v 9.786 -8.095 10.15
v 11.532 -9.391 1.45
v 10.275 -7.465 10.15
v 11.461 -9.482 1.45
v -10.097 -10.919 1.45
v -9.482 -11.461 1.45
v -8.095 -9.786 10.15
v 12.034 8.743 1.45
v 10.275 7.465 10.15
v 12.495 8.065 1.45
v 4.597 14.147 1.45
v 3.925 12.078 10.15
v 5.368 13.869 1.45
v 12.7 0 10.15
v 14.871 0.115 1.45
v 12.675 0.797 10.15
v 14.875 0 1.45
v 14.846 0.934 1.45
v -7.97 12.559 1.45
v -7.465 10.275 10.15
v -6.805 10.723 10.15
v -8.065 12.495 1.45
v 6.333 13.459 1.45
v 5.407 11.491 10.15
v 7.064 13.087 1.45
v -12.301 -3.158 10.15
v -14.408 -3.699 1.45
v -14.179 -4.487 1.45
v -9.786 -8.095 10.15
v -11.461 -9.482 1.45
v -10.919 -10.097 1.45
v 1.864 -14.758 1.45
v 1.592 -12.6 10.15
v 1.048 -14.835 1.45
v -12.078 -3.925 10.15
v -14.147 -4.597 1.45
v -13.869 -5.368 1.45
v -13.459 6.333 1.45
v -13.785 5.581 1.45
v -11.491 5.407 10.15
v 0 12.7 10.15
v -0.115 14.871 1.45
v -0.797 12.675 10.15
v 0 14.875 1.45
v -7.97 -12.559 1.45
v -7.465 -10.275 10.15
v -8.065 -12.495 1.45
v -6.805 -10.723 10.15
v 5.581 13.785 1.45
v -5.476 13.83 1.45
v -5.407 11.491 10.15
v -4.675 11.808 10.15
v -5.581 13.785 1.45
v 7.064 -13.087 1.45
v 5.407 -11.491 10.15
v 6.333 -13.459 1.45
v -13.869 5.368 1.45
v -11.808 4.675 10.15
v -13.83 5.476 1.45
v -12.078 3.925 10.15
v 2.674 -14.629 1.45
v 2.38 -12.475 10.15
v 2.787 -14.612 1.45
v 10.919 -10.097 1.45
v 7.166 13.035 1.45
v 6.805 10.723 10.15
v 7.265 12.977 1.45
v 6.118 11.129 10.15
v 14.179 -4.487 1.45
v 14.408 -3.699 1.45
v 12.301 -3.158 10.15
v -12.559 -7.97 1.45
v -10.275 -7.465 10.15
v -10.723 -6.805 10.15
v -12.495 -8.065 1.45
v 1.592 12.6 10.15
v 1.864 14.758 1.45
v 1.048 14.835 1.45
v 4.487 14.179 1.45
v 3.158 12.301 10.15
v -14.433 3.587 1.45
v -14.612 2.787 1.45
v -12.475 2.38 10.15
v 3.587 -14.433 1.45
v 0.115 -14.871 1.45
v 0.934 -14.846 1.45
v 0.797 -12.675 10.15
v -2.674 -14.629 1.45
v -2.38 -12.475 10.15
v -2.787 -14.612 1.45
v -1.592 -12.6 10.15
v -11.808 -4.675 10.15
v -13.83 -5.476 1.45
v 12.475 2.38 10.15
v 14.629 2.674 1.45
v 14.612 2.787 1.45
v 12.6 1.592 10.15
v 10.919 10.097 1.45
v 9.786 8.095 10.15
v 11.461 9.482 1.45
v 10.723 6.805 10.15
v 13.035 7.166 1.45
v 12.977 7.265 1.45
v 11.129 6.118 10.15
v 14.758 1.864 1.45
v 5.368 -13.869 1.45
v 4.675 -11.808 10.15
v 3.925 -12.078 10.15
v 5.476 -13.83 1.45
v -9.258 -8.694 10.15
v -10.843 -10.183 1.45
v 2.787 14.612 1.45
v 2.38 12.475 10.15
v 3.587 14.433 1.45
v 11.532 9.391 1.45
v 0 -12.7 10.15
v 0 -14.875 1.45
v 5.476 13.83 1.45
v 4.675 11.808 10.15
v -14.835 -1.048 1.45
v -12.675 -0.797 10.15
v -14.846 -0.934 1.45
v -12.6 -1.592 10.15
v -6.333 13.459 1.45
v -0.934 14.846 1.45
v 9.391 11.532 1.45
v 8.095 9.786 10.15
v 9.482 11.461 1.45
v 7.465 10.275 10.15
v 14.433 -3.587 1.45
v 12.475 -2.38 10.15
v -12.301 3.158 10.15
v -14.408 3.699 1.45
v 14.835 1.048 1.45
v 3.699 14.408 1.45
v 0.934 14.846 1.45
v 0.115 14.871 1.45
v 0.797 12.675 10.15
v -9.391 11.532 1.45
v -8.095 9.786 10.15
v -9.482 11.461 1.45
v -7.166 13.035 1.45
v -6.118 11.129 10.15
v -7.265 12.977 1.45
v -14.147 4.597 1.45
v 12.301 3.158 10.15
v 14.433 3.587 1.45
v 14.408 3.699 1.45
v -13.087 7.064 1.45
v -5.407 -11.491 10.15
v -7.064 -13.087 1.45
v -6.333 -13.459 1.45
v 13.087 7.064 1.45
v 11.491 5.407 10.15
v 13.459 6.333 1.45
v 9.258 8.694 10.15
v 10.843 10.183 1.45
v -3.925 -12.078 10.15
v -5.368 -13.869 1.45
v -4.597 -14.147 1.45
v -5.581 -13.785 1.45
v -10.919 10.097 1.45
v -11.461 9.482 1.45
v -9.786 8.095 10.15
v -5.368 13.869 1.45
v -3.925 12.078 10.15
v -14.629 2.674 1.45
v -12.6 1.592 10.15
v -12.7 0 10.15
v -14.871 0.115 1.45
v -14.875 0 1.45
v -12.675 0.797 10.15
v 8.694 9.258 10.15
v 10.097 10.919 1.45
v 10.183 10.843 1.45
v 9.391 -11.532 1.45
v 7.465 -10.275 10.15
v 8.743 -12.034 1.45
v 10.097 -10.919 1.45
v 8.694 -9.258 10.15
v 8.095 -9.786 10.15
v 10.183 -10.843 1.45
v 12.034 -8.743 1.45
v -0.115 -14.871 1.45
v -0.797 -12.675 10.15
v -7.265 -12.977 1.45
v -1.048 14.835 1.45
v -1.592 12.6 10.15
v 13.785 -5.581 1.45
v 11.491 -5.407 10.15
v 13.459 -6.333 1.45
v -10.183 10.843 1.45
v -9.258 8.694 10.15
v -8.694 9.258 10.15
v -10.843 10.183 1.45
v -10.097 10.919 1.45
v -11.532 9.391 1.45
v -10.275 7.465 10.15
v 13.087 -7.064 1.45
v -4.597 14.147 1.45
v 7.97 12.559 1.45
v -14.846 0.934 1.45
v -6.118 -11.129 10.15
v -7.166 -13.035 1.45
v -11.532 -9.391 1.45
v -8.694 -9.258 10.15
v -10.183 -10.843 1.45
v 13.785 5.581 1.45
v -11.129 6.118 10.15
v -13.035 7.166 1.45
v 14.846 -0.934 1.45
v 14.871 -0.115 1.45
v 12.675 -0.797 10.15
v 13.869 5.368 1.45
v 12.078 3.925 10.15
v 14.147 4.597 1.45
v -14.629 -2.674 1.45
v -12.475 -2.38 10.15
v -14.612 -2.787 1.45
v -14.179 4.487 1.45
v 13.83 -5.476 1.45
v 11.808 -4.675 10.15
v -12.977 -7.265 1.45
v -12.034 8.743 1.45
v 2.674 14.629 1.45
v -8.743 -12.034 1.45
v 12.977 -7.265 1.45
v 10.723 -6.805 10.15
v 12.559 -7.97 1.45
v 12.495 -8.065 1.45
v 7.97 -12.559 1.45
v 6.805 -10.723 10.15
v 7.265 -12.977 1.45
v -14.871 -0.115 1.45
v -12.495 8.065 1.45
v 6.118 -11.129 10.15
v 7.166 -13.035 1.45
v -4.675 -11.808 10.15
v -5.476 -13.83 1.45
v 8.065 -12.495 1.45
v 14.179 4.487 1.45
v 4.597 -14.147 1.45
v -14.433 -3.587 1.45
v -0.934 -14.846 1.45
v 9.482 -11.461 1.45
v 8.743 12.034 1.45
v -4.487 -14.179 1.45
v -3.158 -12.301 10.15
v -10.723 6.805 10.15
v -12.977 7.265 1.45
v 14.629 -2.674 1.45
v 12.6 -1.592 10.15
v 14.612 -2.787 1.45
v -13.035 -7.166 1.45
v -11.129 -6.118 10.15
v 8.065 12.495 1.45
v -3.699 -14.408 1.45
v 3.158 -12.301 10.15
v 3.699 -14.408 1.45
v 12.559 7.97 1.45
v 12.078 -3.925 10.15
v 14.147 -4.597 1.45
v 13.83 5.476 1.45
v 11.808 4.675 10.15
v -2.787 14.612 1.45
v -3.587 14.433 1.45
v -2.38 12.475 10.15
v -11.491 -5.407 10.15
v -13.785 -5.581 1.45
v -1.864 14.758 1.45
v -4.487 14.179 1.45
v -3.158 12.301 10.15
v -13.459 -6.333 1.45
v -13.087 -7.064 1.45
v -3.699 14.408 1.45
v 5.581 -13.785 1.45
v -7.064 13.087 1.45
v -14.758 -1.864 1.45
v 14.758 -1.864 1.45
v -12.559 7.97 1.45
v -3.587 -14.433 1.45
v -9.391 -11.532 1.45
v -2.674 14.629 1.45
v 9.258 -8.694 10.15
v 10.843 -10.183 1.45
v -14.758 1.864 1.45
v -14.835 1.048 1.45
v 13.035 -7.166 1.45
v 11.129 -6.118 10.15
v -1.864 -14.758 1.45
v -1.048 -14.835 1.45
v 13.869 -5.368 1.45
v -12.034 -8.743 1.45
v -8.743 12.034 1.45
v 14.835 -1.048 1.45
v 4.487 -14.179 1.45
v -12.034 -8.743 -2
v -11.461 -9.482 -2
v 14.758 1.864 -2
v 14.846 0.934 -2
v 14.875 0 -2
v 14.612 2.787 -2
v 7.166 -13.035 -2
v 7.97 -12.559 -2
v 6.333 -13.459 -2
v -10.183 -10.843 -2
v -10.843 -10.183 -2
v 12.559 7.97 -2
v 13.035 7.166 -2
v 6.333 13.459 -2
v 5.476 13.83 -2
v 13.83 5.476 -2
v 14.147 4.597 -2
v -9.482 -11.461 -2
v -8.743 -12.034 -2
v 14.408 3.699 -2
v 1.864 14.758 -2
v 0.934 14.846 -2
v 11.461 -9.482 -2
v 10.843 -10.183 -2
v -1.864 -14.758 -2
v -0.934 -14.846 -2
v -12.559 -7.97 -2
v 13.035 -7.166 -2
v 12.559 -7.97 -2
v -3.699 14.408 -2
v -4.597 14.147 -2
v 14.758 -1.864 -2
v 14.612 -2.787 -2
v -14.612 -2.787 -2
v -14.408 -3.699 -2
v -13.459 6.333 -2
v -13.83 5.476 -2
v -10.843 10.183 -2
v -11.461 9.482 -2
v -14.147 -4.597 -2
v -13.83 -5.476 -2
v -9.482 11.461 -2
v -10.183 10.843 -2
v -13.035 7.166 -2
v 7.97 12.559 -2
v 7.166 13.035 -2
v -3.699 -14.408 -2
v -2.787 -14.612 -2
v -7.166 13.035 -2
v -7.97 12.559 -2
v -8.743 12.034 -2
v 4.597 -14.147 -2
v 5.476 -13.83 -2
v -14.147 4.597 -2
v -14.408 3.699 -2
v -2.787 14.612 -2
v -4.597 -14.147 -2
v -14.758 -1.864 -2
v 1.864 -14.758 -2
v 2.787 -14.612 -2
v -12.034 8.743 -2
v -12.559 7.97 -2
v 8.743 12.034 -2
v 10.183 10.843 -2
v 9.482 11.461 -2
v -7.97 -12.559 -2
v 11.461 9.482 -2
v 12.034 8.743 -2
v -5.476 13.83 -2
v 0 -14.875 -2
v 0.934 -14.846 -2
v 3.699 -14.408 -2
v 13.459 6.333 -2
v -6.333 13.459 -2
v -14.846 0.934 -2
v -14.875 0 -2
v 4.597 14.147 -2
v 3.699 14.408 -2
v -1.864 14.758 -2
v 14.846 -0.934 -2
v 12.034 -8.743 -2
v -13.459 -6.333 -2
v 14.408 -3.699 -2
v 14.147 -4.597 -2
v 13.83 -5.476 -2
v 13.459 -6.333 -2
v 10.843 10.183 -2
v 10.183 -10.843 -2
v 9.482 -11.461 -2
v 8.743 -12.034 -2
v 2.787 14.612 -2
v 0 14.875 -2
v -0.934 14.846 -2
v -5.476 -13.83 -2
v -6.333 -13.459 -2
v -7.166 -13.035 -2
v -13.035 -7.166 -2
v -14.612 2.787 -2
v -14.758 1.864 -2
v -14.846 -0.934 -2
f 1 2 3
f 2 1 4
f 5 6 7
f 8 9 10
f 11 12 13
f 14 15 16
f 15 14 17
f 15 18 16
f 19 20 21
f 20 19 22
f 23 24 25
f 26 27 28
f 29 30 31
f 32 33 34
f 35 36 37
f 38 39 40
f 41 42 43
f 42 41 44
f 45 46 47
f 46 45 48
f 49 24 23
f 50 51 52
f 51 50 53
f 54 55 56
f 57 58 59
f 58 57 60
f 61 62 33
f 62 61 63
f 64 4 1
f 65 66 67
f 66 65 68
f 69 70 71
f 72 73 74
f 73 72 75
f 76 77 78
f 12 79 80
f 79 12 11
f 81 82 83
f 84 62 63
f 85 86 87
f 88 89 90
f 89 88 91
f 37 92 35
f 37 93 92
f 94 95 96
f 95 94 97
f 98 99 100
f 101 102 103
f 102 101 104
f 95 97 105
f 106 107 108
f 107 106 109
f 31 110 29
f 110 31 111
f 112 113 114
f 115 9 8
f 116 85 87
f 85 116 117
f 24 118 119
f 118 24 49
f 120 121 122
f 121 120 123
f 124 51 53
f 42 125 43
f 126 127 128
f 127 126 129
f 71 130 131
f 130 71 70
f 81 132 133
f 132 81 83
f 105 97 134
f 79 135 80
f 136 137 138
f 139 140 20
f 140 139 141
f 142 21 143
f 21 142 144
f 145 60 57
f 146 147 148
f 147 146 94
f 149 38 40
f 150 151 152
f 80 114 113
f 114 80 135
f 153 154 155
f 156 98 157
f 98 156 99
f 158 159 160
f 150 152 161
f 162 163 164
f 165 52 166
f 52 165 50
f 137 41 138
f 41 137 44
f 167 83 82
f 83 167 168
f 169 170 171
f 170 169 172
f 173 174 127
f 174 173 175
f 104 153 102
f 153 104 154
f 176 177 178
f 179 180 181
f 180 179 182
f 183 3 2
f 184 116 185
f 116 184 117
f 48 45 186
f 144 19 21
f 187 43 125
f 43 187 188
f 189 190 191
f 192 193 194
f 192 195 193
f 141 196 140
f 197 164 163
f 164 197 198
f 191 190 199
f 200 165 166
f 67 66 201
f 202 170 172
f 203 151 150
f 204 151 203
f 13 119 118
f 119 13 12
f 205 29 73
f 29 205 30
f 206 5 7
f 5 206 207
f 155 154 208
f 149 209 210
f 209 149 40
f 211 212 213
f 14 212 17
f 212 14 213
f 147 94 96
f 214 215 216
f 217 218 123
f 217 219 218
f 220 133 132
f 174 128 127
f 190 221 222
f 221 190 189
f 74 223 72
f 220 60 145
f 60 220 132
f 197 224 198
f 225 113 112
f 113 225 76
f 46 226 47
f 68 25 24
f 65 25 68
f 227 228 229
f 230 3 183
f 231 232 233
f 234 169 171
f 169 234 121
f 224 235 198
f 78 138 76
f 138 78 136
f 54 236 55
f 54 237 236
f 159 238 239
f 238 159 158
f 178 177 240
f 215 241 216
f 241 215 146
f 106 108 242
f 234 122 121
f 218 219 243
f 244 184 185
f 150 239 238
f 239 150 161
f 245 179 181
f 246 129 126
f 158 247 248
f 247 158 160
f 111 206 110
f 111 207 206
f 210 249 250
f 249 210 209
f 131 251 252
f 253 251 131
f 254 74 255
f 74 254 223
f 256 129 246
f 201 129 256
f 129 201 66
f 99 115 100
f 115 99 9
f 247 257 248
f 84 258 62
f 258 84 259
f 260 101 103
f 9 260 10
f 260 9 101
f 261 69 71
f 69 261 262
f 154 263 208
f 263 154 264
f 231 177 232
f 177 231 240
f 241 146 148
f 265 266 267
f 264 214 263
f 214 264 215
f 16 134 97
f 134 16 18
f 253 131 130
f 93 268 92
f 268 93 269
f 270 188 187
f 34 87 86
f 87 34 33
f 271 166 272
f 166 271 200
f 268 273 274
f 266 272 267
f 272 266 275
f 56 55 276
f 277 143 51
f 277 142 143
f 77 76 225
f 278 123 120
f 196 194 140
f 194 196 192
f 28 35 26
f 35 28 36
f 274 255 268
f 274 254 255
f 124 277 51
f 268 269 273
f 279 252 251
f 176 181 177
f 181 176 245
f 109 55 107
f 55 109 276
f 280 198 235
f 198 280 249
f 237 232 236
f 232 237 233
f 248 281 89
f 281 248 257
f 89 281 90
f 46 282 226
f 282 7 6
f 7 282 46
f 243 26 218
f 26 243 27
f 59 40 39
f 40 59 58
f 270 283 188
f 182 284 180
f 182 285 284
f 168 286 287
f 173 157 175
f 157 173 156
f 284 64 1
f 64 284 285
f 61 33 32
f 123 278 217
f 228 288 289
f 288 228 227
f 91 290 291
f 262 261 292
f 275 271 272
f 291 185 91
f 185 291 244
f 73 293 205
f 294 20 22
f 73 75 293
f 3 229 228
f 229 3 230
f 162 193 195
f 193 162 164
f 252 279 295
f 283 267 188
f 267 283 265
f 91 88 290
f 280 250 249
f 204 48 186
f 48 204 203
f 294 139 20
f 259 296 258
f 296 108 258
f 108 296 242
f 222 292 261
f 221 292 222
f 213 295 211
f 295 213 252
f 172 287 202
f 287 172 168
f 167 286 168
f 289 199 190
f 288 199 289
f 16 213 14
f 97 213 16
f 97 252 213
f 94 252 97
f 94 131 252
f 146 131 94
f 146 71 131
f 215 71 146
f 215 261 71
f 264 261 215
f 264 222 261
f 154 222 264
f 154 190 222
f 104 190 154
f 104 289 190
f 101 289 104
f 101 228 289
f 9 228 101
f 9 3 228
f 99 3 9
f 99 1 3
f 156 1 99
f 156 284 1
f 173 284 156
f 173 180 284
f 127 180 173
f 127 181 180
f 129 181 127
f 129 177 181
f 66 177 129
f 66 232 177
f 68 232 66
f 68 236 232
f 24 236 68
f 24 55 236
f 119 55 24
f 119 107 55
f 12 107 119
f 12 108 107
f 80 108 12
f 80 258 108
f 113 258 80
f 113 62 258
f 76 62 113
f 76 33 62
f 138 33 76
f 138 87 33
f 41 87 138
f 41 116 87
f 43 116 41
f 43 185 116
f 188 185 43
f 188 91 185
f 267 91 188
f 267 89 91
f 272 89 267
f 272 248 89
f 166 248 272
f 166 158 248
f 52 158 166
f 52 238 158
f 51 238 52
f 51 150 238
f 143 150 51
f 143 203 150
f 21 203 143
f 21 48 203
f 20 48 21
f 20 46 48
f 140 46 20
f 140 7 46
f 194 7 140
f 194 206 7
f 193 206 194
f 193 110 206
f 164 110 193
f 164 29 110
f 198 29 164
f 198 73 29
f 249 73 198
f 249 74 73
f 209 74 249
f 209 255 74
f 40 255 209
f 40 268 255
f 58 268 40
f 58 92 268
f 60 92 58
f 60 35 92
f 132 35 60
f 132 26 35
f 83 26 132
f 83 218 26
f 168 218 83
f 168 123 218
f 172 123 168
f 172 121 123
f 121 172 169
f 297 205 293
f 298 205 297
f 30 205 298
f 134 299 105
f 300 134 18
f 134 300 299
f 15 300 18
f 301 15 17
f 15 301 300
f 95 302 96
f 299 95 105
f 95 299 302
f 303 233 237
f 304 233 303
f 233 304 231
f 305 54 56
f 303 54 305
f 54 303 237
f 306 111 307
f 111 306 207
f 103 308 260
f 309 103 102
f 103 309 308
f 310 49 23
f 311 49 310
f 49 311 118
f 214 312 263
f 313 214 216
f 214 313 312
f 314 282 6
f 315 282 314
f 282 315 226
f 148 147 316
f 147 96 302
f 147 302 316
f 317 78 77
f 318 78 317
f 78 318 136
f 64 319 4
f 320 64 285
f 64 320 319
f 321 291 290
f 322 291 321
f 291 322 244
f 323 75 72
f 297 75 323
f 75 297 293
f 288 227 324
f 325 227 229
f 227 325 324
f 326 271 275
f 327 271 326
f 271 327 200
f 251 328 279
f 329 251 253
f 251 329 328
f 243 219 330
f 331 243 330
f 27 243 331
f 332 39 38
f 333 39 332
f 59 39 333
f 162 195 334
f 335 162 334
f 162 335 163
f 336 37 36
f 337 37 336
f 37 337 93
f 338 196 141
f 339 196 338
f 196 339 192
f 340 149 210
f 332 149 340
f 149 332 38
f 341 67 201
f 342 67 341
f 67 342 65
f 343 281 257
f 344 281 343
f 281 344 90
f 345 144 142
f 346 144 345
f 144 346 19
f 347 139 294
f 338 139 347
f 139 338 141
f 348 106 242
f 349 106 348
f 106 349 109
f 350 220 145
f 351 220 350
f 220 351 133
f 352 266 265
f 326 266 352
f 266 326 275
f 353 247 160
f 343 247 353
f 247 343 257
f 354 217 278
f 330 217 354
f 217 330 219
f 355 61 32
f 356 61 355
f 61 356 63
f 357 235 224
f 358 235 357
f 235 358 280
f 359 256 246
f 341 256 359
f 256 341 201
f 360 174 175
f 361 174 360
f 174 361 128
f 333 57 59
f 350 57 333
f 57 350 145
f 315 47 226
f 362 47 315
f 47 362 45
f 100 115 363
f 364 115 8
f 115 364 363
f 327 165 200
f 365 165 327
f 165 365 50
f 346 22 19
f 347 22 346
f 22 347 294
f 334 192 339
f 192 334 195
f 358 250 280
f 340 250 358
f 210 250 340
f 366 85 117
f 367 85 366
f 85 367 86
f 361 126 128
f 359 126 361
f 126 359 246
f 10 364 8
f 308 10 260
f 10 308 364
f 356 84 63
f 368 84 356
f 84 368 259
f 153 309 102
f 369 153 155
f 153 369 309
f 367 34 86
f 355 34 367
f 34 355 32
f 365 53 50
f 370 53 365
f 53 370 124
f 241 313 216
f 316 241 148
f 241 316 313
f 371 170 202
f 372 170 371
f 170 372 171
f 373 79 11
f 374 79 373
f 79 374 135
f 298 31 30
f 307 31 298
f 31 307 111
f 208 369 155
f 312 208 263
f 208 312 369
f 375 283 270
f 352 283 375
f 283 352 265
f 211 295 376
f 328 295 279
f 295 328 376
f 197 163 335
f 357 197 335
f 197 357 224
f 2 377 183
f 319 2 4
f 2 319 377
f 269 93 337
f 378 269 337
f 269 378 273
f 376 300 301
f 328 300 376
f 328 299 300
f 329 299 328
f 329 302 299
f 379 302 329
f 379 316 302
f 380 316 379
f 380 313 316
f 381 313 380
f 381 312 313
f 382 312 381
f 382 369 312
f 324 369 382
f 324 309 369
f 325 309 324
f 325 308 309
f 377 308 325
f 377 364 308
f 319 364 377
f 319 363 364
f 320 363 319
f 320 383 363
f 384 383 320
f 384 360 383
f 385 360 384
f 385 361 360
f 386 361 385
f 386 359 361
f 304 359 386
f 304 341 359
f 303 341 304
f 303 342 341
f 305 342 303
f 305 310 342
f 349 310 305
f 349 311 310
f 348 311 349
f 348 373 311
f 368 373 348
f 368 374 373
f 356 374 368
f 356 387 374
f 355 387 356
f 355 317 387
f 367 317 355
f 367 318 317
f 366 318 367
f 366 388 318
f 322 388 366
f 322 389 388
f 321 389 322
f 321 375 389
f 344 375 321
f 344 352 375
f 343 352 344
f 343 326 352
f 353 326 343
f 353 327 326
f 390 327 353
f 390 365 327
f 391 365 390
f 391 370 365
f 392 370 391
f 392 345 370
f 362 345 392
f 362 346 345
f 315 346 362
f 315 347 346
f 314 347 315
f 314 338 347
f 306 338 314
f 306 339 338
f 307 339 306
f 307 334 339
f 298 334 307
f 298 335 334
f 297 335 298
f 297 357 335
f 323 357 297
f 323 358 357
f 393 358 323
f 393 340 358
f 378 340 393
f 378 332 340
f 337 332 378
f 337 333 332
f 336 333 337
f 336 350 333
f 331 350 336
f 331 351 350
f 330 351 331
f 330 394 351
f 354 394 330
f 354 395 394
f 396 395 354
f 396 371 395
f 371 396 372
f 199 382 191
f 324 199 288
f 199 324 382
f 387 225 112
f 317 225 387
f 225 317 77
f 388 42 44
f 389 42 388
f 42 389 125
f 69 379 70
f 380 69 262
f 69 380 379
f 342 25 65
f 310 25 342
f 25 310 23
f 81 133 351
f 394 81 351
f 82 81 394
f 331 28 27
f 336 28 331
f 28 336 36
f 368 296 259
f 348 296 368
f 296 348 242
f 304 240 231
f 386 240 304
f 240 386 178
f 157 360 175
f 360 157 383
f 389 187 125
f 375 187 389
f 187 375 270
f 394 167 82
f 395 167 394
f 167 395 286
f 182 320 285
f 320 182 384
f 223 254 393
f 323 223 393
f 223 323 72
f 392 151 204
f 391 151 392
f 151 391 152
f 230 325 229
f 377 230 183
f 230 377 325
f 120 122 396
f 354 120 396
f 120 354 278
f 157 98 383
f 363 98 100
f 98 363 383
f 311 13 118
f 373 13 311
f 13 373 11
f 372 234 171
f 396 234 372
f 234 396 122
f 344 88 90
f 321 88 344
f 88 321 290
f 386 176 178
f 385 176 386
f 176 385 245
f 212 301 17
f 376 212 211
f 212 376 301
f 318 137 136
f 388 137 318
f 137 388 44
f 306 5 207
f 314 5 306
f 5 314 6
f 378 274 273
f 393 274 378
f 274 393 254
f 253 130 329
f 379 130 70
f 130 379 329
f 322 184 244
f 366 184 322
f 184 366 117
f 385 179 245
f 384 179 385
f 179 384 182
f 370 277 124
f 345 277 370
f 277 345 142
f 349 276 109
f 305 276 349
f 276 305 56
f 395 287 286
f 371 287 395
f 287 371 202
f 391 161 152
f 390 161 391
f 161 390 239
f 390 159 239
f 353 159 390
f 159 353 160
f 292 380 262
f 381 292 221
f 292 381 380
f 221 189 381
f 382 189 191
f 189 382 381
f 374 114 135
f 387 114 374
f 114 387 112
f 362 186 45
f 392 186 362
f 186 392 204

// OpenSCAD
difference() {
 translate([0,0,-2]) union() {
    cylinder(d=inches(1.25)-2,h=inches(0.5)+6,$fn=100);
  }
difference() {
  union() {
    cylinder(d1=inches(1.5), d2=inches(1.75), h=inches(0.5), $fn=100);
    translate([0,0,inches(0.5)-.01]) cylinder(d=inches(1.75), h=10, $fn=100);
  }
  translate([0,0,-.01]) cylinder(d1=inches(1.2),d2=inches(1),h=inches(0.4),$fn=100);
  *#translate([0,0,inches(0.5)+3]) rotate([0,90]) rotate_extrude($fn=50) translate([5,0]) circle(d=4,$fn=30);
}
}
function inches(in) = 25.4 * in;
